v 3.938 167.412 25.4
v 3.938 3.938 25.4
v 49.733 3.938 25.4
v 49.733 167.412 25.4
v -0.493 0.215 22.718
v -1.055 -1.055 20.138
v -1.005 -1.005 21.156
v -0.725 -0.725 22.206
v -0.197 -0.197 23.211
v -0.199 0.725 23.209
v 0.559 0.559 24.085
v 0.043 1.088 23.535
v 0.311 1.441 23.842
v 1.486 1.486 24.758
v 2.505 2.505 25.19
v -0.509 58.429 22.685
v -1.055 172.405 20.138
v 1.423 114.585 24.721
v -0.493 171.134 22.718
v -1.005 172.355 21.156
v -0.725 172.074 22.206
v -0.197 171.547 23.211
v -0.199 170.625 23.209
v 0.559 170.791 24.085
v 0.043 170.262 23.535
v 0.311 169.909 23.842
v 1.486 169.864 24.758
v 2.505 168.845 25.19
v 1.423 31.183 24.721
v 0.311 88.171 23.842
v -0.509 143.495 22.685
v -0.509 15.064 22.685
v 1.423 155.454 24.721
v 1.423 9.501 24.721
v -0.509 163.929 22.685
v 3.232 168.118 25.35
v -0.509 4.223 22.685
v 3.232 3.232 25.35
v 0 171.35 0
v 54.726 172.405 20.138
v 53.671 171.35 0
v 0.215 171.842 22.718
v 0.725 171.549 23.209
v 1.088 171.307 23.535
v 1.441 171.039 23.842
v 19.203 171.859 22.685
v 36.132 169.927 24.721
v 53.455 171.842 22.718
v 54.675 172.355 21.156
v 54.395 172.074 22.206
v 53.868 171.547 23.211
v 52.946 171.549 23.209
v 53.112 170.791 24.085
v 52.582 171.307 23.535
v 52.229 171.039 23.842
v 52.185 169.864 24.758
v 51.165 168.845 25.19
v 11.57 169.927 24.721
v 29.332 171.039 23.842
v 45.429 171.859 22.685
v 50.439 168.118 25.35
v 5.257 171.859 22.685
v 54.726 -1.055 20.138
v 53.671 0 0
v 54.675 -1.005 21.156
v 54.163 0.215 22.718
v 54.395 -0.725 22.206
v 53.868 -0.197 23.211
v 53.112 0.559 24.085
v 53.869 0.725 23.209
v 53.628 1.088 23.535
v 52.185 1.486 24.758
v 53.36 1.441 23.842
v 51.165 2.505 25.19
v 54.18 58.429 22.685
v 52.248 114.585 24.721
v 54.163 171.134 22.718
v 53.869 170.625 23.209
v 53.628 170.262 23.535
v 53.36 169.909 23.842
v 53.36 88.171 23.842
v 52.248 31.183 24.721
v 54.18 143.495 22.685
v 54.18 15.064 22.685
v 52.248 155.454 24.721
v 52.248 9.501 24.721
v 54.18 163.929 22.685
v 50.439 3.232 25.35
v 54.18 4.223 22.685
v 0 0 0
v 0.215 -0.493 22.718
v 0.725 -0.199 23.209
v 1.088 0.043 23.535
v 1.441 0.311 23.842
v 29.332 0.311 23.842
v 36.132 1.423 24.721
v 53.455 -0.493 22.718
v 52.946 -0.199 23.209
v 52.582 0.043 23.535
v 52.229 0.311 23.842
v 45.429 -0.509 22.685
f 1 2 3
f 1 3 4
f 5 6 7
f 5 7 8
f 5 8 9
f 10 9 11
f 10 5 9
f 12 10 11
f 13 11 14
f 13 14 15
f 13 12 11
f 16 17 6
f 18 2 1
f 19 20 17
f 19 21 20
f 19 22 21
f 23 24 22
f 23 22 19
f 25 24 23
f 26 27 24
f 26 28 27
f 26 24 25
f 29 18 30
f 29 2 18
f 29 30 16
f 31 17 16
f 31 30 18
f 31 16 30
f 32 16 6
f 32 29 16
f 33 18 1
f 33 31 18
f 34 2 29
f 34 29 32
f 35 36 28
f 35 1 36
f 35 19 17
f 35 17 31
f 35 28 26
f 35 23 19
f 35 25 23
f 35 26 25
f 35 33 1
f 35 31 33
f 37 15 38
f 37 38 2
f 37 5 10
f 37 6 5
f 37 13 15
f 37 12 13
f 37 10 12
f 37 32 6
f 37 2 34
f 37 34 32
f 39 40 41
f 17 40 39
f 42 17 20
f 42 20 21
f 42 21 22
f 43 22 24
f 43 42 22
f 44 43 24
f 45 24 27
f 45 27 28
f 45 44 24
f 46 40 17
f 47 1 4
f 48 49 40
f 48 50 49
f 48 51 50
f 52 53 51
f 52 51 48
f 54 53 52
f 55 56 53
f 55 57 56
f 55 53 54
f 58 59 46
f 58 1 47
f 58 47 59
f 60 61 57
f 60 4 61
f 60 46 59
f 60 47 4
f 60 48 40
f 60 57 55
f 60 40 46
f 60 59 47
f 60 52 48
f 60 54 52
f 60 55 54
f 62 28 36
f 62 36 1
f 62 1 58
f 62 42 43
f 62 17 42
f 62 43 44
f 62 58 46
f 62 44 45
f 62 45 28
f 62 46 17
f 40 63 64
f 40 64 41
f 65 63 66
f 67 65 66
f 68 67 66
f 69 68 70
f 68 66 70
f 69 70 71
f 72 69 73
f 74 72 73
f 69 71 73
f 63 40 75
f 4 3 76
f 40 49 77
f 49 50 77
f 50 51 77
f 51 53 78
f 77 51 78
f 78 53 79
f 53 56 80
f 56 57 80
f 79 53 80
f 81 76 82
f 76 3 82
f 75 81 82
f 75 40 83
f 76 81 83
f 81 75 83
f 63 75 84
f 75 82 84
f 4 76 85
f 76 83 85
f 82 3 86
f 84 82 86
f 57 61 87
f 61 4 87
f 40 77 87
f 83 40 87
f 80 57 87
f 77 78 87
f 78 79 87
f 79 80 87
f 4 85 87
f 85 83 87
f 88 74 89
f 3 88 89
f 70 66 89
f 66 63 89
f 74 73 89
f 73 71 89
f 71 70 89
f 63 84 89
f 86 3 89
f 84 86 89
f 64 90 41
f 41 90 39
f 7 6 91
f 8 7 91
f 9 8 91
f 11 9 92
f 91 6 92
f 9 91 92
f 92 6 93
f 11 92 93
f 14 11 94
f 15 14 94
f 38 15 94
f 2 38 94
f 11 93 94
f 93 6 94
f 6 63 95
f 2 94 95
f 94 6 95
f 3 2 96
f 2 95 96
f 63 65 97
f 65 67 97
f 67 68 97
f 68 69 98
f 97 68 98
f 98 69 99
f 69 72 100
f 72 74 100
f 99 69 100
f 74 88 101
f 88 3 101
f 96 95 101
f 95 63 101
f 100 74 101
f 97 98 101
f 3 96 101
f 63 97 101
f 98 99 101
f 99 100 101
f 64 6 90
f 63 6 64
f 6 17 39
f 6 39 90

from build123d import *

# Parameters (mm, degrees)
F0_W     = 53.6705106497
F0_H     = 171.3497787714
F3_DEPTH = 25.4
F3_TAPER = -3
F5_R     = 5


# Not quite as in the source:
# - the program builds the solid bodies; features that only make, move or delete a surface that nothing else refers to are left out


with BuildPart() as f3:
    # F0 (on Top) → F3 (new body)
    with BuildSketch(Plane.XY):
        with Locations((26.8352553248, 85.6748893857)):
            Rectangle(F0_W, F0_H)
    extrude(amount=F3_DEPTH, taper=F3_TAPER)

    # F5
    f5_edges = [f3.edges().sort_by_distance(p)[0] for p in [
        (-1.331158, 85.674889, 25.4),
        (26.835255, -1.331158, 25.4),
        (55.001668, 85.674889, 25.4),
        (26.835255, 172.680936, 25.4),
    ]]
    fillet(f5_edges, radius=F5_R)


solid = f3.part
